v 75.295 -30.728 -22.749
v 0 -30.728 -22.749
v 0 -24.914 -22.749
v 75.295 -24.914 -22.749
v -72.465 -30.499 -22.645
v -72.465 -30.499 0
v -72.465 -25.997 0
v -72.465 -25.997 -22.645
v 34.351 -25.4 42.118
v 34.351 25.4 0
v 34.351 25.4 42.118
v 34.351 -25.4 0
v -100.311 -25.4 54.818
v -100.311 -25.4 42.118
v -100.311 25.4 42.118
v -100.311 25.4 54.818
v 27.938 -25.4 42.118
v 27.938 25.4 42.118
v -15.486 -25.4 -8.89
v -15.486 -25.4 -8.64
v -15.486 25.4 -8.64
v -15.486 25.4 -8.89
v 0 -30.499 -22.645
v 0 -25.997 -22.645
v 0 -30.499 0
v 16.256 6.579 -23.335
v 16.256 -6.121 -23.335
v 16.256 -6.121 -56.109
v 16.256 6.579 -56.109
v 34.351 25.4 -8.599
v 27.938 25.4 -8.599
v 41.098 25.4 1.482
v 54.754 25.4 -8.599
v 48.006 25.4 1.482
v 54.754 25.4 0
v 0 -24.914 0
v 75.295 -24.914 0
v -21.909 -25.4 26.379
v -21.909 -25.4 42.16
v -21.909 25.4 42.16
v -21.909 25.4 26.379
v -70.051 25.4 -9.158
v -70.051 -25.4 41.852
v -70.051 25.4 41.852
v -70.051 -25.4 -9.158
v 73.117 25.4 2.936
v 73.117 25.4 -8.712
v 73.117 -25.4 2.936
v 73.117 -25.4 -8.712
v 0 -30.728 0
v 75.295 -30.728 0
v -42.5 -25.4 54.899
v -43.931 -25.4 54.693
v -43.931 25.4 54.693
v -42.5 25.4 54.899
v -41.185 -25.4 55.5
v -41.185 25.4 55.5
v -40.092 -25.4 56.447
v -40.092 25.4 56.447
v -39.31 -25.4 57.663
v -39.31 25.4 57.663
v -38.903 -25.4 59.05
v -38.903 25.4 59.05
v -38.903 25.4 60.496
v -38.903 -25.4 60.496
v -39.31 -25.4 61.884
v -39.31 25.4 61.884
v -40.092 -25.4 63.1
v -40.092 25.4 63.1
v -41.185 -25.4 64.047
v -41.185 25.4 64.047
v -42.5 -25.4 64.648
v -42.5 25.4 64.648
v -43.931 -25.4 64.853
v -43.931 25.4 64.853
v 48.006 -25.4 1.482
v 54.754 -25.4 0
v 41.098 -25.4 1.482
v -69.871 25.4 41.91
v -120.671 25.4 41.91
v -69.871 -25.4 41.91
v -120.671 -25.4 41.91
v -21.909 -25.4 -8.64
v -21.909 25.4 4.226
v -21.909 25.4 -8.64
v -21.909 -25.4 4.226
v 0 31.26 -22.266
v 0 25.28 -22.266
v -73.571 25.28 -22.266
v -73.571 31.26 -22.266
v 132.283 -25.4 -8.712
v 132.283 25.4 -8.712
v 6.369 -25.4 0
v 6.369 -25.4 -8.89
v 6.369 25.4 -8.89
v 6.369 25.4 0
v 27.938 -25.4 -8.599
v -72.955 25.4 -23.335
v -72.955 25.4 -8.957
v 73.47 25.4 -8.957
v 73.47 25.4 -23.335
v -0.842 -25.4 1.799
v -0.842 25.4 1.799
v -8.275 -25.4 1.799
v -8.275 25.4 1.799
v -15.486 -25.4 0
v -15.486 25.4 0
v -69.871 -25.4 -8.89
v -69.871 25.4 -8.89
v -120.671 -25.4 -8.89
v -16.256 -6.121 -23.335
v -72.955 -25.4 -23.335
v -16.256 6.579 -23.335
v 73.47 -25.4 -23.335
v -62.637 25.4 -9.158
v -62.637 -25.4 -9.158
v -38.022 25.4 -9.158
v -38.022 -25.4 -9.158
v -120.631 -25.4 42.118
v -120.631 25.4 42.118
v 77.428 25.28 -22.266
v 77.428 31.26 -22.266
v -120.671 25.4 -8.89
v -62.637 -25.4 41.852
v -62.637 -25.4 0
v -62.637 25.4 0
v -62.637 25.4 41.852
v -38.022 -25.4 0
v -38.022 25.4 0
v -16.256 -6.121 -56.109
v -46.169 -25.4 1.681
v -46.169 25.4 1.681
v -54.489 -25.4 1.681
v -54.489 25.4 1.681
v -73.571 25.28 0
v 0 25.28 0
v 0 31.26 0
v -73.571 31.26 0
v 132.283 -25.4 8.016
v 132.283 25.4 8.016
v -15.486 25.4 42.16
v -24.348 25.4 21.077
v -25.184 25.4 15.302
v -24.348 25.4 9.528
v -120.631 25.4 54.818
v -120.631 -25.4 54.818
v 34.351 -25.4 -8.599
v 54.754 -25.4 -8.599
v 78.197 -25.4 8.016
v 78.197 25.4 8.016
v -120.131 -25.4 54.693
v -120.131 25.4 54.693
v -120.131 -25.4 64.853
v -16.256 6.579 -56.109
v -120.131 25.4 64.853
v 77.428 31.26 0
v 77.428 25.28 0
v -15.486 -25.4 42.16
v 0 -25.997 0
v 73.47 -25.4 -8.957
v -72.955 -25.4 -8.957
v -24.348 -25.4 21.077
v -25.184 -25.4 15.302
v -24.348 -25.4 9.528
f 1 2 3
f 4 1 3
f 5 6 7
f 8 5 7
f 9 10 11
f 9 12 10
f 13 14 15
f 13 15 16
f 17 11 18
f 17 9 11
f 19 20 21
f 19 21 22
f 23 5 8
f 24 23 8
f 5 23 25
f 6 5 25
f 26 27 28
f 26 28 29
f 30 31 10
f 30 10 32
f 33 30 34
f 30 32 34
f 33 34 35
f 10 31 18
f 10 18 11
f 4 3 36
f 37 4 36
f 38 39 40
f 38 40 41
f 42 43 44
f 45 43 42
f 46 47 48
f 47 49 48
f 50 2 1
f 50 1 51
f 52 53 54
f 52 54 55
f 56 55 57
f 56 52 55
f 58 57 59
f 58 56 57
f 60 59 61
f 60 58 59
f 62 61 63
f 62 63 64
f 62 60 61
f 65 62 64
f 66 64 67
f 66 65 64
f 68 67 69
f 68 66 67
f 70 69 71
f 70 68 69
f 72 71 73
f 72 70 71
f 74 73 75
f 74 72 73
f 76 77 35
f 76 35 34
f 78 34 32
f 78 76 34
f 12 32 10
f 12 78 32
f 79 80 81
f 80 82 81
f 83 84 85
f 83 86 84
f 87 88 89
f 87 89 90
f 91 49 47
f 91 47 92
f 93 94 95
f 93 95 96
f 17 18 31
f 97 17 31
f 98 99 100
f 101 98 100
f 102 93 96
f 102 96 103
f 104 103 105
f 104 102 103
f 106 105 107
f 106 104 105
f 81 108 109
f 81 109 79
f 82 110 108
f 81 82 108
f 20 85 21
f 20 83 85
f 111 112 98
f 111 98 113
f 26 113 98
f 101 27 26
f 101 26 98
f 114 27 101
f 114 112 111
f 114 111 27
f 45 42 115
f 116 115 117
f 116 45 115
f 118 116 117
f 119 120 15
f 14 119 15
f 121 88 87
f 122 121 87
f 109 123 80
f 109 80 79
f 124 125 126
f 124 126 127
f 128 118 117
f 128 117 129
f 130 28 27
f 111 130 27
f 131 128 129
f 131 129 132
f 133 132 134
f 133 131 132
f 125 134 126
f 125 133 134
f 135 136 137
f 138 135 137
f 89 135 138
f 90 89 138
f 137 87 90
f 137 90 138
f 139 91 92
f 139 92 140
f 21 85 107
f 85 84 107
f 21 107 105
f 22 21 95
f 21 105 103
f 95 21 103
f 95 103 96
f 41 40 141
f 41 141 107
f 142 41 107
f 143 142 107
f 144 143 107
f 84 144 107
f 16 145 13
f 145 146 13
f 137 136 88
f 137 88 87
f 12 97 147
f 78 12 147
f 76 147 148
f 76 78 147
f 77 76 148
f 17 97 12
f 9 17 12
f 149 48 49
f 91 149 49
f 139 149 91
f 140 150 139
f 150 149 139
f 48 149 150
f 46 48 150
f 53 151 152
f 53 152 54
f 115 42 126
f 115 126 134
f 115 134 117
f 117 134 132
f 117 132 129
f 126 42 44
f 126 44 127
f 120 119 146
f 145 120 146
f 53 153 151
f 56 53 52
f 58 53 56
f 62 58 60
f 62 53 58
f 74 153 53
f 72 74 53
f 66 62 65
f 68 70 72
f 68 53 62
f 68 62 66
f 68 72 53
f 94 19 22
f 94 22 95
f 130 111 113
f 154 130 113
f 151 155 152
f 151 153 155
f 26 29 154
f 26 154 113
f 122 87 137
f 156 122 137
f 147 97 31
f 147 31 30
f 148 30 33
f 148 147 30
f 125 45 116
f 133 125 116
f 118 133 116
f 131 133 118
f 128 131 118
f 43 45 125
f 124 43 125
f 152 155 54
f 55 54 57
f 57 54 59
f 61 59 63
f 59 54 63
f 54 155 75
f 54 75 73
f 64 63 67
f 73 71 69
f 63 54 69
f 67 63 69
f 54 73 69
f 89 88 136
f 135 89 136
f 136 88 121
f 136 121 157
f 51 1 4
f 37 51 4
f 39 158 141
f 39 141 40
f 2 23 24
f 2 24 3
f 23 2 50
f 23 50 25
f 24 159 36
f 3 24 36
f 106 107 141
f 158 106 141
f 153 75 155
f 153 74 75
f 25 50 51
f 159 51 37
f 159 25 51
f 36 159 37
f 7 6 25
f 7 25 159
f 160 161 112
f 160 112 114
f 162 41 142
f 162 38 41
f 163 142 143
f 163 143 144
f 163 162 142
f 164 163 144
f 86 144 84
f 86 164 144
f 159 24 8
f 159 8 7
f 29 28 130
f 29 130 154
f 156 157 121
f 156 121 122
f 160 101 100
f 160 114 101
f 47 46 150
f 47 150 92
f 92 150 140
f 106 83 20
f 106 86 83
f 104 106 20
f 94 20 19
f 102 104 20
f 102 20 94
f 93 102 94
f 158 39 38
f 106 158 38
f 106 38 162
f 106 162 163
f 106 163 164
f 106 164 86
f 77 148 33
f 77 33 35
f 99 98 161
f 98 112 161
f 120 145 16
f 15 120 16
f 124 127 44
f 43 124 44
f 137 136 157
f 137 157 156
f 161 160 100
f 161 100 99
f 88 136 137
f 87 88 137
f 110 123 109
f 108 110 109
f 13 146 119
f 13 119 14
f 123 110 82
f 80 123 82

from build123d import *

# Parameters (mm, degrees)
F7_W      = 20.4032808542
F7_H      = 8.5985250771
F8_DEPTH  = 25.4
F6_W      = 59.1665431857
F6_H      = 16.7275518179
F0_W      = 50.3220036626
F0_H      = 14.3777141348
F0_W_2    = 45.4033091664
F0_W_3    = 50.7003590465
F2_W      = 24.6153399348
F2_H      = 9.1578979045
F1_W      = 50.8
F1_H      = 50.8
F3_W      = 20.32
F3_H      = 12.7
F9_W      = 12.7
F9_H      = 33.02
F10_DEPTH = 16.256
F11_SIZE  = 5.08
F12_W     = 5.9804692864
F12_H     = 22.266164422
F14_DEPTH = 77.4276182055
F13_W     = 5.8142244816
F13_H     = 22.748529911
F15_DEPTH = 75.2947013825
F16_W     = 4.5022070408
F16_H     = 22.6454883814
F17_DEPTH = 72.4648684263
F18_DEPTH = 73.5713392496


with BuildPart() as f8:
    # F7 (on Front) → F8 (new body, symmetric)
    with BuildSketch(Plane.XZ):
        Polygon((27.9382038862, 42.1181991696), (27.9382038862, -8.5985250771), (34.3506634235, -8.5985250771), (34.3506634235, 0), (34.3506634235, 42.1181991696), align=None)
        with Locations((44.5523038507, -4.2992625386)):
            Rectangle(F7_W, F7_H)
        with BuildLine():
            ThreePointArc((54.7539442778, 0), (44.5523038507, 1.6690761612), (34.3506634235, 0))
            Line((34.3506634235, 0), (54.7539442778, 0))
        make_face()
    extrude(amount=F8_DEPTH, both=True)


with BuildPart() as f8b:
    # F5 (on Front) → F8, piece 2 (new body, symmetric)
    with BuildSketch(Plane.XZ):
        Polygon((-21.9093549779, 4.226393532), (-21.9093549779, -8.6401629537), (-15.4863672549, -8.6401629537), (-15.4863672549, 0), (-15.4863672549, 42.1598370463), (-21.9093549779, 42.1598370463), (-21.9093549779, 26.3785235584), align=None)
        with BuildLine():
            ThreePointArc((-21.9093549779, 26.3785235584), (-25.1835237072, 15.3024585452), (-21.9093549779, 4.226393532))
            Line((-21.9093549779, 4.226393532), (-21.9093549779, 26.3785235584))
        make_face()
        Polygon((-15.4863672549, 0), (-15.4863672549, -8.6401629537), (-15.4863672549, -8.890000172), (6.3690249808, -8.890000172), (6.3690249808, 0), align=None)
        with BuildLine():
            ThreePointArc((6.3690249808, 0), (-4.558671137, 2.0262505536), (-15.4863672549, 0))
            Line((-15.4863672549, 0), (6.3690249808, 0))
        make_face()
    extrude(amount=F8_DEPTH, both=True)


with BuildPart() as f8c:
    # F6 (on Front) → F8, piece 3 (new body, symmetric)
    with BuildSketch(Plane.XZ):
        with Locations((102.700162679, -0.3482019529)):
            Rectangle(F6_W, F6_H)
    extrude(amount=F8_DEPTH, both=True)

    # F11
    f11_edges = [f8c.edges().sort_by_distance(p)[0] for p in [
        (73.116891, 0, 8.015574),
    ]]
    chamfer(f11_edges, length=F11_SIZE)


with BuildPart() as f8d:
    # F0 (on Front) → F8, piece 4 (new body, symmetric)
    with BuildSketch(Plane.XZ):
        with Locations((2.905998379, -16.1460391246)):
            Rectangle(F0_W, F0_H)
        with Locations((50.7686547935, -16.1460391246)):
            Rectangle(F0_W_2, F0_H)
        with Locations((-47.6051829755, -16.1460391246)):
            Rectangle(F0_W_3, F0_H)
    extrude(amount=F8_DEPTH, both=True)

    # F9 (on Right) → F10 (join, symmetric)
    with BuildSketch(Plane.YZ):
        with Locations((0.2290169545, -39.5990186238)):
            Rectangle(F9_W, F9_H)
    extrude(amount=F10_DEPTH, both=True)


with BuildPart() as f8e:
    # F2 (on Front) → F8, piece 5 (new body, symmetric)
    with BuildSketch(Plane.XZ):
        with Locations((-50.3292120993, -4.5789489523)):
            Rectangle(F2_W, F2_H)
        with BuildLine():
            ThreePointArc((-38.0215421319, 0), (-50.3292120993, 1.8928495448), (-62.6368820667, 0))
            Line((-62.6368820667, 0), (-38.0215421319, 0))
        make_face()
        Polygon((-62.6368820667, 41.8521985412), (-70.0511336327, 41.8521985412), (-70.0511336327, -9.1578979045), (-62.6368820667, -9.1578979045), (-62.6368820667, 0), align=None)
    extrude(amount=F8_DEPTH, both=True)


with BuildPart() as f8f:
    # F1 (on Front) → F8, piece 6 (new body, symmetric)
    with BuildSketch(Plane.XZ):
        with Locations((-95.270825243, 16.509999828)):
            Rectangle(F1_W, F1_H)
    extrude(amount=F8_DEPTH, both=True)


with BuildPart() as f8g:
    # F3 (on Front) → F8, piece 7 (new body, symmetric)
    with BuildSketch(Plane.XZ):
        with Locations((-110.4709812737, 48.4681991696)):
            Rectangle(F3_W, F3_H)
    extrude(amount=F8_DEPTH, both=True)


with BuildPart() as f8h:
    # F4 (on Front) → F8, piece 8 (new body, symmetric)
    with BuildSketch(Plane.XZ):
        with BuildLine():
            Line((-120.1313063502, 64.8532807827), (-120.1313063502, 54.6932807827))
            Line((-120.1313063502, 54.6932807827), (-43.9313063502, 54.6932807827))
            ThreePointArc((-43.9313063502, 54.6932807827), (-38.8513063502, 59.7732807827), (-43.9313063502, 64.8532807827))
            Line((-43.9313063502, 64.8532807827), (-120.1313063502, 64.8532807827))
        make_face()
    extrude(amount=F8_DEPTH, both=True)


with BuildPart() as f14:
    # F12 (on Right) → F14 (new body)
    with BuildSketch(Plane.YZ):
        with Locations((28.2701589167, -11.133082211)):
            Rectangle(F12_W, F12_H)
    extrude(amount=F14_DEPTH)


with BuildPart() as f15:
    # F13 (on Right) → F15 (new body)
    with BuildSketch(Plane.YZ):
        with Locations((-27.8213471174, -11.3742649555)):
            Rectangle(F13_W, F13_H)
    extrude(amount=F15_DEPTH)

    # F16 (on Right) → F17 (join)
    with BuildSketch(Plane.YZ):
        with Locations((-28.2480791211, -11.3227441907)):
            Rectangle(F16_W, F16_H)
    extrude(amount=-F17_DEPTH)


with BuildPart() as f18:
    # F18 (new): a face of the model
    f18_faces = [f14.part.faces().sort_by_distance(p)[0] for p in [
        (0, 28.2701589167, -11.133082211),
    ]]
    extrude(f18_faces, amount=F18_DEPTH)


solid = Compound([f8.part, f8b.part, f8c.part, f8d.part, f8e.part, f8f.part, f8g.part, f8h.part, f14.part, f15.part, f18.part])
